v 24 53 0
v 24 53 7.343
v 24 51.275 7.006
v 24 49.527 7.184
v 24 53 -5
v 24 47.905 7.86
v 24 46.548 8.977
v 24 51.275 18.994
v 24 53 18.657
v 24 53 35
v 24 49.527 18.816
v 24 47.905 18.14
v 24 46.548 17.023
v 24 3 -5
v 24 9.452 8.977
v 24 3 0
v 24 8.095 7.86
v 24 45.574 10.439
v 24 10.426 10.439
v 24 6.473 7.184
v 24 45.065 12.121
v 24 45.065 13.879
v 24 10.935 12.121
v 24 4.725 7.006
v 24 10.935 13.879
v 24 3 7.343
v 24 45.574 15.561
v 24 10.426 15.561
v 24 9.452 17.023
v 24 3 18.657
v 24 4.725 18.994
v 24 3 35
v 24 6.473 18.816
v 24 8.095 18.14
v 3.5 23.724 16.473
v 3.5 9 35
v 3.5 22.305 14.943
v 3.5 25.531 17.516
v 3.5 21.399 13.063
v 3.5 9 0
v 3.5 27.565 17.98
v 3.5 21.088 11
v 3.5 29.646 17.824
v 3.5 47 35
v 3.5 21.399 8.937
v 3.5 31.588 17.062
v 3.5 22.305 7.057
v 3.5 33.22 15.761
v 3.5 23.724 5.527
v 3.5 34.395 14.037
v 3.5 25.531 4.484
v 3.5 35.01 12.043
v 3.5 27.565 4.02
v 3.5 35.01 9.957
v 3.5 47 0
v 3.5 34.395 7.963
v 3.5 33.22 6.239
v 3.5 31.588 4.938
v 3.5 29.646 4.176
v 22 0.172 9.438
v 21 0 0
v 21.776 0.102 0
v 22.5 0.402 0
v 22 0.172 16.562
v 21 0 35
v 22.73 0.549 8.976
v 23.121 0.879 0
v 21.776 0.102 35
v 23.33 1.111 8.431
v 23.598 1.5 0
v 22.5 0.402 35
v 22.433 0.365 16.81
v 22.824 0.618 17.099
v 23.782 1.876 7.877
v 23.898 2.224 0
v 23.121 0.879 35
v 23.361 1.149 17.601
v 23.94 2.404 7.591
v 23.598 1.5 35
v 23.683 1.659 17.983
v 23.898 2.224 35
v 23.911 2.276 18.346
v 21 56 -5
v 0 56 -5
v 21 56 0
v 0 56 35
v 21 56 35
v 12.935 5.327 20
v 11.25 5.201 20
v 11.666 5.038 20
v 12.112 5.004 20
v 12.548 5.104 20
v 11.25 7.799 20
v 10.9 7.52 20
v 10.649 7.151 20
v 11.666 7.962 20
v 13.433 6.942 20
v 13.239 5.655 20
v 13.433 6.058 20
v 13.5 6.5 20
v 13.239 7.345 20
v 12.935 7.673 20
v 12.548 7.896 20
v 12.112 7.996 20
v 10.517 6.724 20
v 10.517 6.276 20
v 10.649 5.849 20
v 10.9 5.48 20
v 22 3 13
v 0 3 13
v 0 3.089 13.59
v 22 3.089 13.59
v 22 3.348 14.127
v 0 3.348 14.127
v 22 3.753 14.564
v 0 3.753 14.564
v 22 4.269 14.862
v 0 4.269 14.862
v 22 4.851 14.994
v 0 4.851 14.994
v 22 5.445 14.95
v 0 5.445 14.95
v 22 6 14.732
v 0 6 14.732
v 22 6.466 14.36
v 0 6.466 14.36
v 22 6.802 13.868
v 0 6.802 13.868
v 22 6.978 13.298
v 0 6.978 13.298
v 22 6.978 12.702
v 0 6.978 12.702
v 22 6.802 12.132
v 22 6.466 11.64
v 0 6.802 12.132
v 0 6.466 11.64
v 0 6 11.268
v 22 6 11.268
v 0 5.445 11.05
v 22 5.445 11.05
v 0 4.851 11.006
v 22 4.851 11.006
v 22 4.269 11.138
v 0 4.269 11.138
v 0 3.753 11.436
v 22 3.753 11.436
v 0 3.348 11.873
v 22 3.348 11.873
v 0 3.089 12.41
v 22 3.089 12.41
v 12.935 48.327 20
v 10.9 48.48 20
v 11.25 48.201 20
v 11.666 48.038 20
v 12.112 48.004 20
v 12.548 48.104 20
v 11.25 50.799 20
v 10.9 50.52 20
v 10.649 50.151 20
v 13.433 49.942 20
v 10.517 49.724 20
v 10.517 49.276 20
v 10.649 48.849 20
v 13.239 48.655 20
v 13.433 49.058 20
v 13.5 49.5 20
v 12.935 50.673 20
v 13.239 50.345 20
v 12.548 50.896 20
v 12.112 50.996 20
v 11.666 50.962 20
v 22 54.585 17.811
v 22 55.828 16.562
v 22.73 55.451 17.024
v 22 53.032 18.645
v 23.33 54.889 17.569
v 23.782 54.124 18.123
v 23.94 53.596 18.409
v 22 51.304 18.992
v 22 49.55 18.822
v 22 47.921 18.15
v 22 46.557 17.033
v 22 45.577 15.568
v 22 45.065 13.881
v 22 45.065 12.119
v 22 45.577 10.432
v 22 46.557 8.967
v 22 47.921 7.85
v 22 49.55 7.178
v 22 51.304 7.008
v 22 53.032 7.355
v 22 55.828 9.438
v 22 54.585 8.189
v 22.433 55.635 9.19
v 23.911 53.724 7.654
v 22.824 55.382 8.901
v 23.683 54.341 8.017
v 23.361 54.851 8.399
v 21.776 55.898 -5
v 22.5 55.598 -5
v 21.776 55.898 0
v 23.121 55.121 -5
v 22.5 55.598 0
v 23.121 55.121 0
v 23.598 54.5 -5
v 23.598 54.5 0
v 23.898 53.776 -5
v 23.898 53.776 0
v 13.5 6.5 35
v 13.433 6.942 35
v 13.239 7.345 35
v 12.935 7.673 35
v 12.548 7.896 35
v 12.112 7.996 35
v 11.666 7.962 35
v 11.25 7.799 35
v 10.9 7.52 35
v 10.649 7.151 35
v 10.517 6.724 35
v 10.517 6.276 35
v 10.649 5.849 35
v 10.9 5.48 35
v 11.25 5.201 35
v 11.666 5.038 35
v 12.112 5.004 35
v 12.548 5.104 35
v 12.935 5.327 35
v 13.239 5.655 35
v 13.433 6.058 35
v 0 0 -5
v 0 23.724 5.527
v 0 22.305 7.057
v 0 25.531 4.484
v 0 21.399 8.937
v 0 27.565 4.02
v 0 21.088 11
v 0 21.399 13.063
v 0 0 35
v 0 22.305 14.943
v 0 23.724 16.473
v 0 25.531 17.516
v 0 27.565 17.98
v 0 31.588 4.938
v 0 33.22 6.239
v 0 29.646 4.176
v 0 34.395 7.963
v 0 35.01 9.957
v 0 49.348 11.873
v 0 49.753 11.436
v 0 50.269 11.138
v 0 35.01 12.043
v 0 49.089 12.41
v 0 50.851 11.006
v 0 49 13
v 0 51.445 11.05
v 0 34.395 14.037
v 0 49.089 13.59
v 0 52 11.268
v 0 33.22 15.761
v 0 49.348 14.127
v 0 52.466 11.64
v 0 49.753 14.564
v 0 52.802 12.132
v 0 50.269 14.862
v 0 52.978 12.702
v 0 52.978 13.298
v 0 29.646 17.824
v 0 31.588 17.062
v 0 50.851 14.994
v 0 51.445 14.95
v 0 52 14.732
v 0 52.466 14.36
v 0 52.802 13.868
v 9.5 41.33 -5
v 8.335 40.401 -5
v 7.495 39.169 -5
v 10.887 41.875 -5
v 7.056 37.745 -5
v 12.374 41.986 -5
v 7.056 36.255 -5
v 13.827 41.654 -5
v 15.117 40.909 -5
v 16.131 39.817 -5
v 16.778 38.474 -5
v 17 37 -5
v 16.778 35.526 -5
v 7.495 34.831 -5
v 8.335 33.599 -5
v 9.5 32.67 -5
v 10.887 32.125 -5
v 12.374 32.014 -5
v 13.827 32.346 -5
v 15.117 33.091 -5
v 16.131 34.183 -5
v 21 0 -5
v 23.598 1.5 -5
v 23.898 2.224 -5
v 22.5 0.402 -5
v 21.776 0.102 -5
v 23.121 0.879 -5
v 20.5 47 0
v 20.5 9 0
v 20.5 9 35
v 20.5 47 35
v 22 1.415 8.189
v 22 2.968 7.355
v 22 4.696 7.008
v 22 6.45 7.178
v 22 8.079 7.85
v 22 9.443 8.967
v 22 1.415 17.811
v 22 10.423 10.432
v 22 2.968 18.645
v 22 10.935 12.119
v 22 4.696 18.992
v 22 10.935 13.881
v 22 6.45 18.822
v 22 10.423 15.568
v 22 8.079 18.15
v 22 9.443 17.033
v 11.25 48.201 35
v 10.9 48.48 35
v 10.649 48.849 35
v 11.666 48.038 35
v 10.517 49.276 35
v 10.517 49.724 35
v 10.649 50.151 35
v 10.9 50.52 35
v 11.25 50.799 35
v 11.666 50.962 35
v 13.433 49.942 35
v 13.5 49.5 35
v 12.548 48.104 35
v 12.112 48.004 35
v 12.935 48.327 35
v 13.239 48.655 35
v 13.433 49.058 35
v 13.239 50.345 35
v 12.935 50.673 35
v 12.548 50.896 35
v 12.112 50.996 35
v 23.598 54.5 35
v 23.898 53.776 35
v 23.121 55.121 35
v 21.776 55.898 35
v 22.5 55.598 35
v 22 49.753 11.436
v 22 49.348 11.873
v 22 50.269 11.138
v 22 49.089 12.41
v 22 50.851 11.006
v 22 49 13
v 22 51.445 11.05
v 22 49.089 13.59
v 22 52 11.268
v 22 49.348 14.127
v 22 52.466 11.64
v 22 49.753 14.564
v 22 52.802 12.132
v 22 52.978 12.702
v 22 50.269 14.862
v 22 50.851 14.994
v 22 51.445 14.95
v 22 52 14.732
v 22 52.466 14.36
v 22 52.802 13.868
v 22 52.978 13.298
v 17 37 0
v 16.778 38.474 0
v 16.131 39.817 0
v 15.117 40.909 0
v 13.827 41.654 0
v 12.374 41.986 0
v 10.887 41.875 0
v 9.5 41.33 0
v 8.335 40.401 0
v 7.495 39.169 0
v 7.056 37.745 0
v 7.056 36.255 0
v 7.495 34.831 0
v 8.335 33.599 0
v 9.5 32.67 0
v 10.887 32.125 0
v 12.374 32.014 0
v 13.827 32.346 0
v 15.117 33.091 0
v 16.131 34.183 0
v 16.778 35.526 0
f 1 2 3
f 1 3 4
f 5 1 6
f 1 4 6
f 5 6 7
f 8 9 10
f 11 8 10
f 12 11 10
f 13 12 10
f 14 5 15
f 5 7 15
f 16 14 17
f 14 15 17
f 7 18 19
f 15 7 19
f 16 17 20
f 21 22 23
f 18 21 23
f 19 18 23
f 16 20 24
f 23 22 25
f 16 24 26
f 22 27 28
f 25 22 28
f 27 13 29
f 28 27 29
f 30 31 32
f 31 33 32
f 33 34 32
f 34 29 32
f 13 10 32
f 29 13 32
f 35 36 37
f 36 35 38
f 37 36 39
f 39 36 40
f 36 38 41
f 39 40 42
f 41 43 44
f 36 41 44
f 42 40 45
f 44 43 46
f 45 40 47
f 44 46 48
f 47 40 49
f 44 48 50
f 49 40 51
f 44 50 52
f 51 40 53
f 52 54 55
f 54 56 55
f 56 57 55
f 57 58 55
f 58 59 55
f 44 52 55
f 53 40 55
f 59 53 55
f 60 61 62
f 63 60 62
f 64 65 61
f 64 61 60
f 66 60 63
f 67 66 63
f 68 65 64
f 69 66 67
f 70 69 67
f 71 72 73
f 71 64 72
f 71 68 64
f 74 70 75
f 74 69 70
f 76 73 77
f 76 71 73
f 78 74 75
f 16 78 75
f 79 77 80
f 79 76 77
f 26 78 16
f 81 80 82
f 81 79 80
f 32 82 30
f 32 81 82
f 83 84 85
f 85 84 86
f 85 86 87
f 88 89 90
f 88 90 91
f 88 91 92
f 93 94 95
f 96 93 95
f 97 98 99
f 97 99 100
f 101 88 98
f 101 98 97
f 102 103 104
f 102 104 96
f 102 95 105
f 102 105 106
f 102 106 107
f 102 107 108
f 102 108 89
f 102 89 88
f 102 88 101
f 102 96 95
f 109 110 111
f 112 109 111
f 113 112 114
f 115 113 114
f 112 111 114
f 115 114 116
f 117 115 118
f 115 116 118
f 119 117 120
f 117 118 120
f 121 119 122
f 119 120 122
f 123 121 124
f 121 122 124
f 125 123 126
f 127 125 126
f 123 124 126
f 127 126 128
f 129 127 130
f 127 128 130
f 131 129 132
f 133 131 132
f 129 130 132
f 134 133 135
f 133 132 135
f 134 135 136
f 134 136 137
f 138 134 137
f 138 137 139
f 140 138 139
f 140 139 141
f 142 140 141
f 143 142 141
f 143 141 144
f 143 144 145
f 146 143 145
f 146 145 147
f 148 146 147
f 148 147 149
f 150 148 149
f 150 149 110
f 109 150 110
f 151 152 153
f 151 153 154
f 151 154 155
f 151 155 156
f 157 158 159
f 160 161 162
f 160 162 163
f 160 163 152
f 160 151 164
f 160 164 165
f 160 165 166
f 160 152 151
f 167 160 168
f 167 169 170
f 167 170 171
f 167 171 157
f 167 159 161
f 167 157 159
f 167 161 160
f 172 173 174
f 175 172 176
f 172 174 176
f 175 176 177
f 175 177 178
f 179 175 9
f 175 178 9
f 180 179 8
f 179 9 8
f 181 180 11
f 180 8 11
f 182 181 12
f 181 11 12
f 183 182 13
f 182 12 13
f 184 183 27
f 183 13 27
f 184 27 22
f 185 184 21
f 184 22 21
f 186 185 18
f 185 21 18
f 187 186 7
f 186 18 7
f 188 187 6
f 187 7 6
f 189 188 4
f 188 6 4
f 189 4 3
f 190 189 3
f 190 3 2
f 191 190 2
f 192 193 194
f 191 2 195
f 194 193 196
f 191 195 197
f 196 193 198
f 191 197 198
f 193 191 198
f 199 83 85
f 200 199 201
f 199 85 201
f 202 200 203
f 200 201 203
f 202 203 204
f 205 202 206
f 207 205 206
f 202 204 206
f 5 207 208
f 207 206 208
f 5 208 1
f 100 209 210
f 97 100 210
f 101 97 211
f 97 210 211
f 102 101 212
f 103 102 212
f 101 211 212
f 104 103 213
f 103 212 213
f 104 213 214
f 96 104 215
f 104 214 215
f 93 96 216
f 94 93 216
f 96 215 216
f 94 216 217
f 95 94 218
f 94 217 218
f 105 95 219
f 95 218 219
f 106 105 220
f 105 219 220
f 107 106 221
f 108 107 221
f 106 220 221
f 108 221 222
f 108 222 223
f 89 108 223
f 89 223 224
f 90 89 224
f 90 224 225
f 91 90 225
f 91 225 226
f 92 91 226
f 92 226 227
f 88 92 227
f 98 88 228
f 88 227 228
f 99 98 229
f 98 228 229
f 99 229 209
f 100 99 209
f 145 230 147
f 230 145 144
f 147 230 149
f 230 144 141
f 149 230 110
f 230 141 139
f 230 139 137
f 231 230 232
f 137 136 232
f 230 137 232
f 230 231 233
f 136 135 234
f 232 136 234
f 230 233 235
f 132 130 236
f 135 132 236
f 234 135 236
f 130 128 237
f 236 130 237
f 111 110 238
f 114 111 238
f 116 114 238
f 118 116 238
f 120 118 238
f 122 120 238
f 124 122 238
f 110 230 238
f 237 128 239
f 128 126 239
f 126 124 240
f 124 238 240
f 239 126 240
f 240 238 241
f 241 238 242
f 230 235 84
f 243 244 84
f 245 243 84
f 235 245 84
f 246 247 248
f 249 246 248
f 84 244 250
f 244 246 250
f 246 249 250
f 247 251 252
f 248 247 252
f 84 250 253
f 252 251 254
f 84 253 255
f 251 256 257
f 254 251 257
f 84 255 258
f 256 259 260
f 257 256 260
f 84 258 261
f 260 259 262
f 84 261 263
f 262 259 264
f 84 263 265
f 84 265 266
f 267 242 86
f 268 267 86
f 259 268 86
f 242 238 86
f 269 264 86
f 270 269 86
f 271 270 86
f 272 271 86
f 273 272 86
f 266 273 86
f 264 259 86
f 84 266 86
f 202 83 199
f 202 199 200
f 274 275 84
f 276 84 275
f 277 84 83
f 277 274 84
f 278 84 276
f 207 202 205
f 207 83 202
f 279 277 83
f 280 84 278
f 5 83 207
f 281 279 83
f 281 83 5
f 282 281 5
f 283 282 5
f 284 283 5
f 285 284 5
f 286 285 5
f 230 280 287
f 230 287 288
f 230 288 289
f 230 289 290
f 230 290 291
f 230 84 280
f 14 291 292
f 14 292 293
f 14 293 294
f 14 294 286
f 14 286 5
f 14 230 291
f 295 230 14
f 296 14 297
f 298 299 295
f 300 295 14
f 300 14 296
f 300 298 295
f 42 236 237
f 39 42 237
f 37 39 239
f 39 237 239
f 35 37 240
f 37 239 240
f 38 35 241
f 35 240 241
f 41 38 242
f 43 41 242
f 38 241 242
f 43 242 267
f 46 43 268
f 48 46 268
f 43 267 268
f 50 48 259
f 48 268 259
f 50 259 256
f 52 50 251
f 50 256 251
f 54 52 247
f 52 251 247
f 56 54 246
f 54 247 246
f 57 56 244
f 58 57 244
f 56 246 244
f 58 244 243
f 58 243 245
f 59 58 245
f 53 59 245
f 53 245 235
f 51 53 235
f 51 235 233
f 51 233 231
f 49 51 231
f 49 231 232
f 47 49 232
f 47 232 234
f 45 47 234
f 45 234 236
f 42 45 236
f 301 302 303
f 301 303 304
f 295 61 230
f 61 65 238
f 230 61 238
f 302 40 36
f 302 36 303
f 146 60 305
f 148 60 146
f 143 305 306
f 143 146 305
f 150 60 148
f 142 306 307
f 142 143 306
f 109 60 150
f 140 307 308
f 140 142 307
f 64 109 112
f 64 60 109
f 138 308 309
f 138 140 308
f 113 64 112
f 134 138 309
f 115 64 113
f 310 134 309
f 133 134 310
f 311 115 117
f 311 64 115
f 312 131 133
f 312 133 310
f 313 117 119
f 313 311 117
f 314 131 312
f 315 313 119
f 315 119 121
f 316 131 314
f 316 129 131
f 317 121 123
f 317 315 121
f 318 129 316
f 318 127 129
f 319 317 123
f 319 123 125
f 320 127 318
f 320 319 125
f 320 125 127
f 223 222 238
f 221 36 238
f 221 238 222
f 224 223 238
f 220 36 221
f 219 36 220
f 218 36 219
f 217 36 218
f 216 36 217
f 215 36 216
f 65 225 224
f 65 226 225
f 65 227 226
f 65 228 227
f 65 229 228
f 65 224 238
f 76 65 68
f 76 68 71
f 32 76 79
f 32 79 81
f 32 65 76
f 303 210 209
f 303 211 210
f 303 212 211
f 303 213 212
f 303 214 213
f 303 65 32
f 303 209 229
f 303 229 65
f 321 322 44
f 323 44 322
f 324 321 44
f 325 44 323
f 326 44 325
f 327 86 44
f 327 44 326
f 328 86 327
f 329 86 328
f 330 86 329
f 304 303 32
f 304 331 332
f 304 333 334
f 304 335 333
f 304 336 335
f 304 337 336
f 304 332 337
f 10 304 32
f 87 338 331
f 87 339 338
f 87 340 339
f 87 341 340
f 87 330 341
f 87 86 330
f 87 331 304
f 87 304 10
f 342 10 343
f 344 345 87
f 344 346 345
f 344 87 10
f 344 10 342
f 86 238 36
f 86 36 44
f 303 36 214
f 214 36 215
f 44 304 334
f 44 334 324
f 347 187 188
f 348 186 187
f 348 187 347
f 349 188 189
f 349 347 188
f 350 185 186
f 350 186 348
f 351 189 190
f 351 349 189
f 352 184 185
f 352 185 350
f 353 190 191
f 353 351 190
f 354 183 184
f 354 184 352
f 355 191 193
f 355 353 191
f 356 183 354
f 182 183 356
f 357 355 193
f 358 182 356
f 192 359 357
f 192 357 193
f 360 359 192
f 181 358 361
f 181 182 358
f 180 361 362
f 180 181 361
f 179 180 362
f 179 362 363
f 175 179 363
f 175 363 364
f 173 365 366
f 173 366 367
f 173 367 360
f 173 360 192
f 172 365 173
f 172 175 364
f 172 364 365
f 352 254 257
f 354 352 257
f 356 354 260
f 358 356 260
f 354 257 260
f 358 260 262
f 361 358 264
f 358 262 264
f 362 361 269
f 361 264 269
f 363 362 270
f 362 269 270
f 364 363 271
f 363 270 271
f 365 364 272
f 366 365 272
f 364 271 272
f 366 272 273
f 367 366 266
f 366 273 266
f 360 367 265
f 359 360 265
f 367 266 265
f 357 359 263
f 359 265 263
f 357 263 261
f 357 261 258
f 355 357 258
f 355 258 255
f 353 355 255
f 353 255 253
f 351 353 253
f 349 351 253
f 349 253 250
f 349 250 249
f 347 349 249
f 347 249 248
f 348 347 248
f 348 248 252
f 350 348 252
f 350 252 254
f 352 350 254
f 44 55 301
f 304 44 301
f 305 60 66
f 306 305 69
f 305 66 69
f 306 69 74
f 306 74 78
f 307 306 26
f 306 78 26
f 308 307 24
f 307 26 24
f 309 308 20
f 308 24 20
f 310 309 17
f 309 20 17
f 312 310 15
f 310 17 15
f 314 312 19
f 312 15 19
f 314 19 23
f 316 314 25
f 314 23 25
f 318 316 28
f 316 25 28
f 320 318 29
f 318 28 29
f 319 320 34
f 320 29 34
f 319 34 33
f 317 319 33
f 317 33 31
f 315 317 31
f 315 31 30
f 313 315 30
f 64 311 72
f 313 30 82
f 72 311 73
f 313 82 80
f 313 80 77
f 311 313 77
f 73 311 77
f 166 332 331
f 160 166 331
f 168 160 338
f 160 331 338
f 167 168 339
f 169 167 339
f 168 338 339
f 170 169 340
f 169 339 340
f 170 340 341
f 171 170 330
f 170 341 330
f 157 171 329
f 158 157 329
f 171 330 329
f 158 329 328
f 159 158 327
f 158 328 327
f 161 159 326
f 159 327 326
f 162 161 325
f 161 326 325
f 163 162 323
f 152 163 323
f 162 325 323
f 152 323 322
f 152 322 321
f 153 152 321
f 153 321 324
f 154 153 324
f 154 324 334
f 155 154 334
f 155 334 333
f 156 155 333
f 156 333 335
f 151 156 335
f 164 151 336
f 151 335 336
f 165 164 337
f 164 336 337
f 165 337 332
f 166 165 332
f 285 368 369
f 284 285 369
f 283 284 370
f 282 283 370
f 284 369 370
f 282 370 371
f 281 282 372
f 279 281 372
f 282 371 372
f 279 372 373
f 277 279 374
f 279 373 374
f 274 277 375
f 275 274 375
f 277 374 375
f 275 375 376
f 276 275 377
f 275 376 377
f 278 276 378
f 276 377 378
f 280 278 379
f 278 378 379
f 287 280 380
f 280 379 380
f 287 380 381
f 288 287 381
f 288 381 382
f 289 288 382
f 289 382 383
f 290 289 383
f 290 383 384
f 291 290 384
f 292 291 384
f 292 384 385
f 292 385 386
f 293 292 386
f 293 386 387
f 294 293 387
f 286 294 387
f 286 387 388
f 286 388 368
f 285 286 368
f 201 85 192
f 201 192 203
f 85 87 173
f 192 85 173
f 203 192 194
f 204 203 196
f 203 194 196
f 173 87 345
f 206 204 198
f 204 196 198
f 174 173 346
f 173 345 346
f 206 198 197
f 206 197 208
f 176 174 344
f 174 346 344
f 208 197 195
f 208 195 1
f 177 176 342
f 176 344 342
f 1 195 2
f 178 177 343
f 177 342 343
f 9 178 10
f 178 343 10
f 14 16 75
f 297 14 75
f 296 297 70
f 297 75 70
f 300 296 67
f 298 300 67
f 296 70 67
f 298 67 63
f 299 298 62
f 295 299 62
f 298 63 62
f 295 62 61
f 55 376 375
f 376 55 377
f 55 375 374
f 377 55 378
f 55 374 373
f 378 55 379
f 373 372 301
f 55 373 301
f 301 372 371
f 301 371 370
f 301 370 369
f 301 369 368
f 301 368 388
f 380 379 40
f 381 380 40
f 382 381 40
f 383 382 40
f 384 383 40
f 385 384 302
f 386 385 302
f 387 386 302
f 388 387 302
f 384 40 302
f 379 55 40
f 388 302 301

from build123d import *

# Parameters (mm, degrees)
F0_W      = 24
F0_H      = 56
F0_W_2    = 17
F0_H_2    = 38
F1_DEPTH  = 35
F2_R      = 1.5
F3_DEPTH  = 15
F4_R      = 3
F6_DEPTH  = 5
F7_R      = 5
F8_DEPTH  = 25
F9_R      = 2
F10_DEPTH = 25
F11_R     = 6
F12_DEPTH = 2
F13_R     = 7
F14_DEPTH = 4


with BuildPart() as f1:
    # F0 (on Top) → F1 (new body)
    with BuildSketch(Plane.XY):
        with Locations((12, 28)):
            Rectangle(F0_W, F0_H)
        with Locations((12, 28)):
            Rectangle(F0_W_2, F0_H_2, mode=Mode.SUBTRACT)
    extrude(amount=F1_DEPTH)

    # F2 (on face) → F3 (cut)
    with BuildSketch(Plane.XY.offset(35)):
        with Locations((12, 49.5)):
            Circle(F2_R)
        with Locations((12, 6.5)):
            Circle(F2_R)
    extrude(amount=-F3_DEPTH, mode=Mode.SUBTRACT)

    # F4
    f4_edges = [f1.edges().sort_by_distance(p)[0] for p in [
        (24, 0, 17.5),
        (24, 56, 17.5),
    ]]
    fillet(f4_edges, radius=F4_R)

    # F5 (on face) → F6 (join)
    with BuildSketch(Plane(origin=(0, 0, 0), x_dir=(1, 0, 0), z_dir=(0, 0, -1))):
        with BuildLine():
            Line((21, 0), (0, 0))
            Line((0, 0), (0, -56))
            Line((0, -56), (21, -56))
            ThreePointArc((21, -56), (23.12132, -55.12132), (24, -53))
            Line((24, -53), (24, -3))
            ThreePointArc((24, -3), (23.12132, -0.87868), (21, 0))
        make_face()
    extrude(amount=F6_DEPTH)

    # F7 (on face) → F8 (cut)
    with BuildSketch(Plane.XY):
        with Locations((12, 37)):
            Circle(F7_R)
    extrude(amount=-F8_DEPTH, mode=Mode.SUBTRACT)

    # F9 (on face) → F10 (cut)
    with BuildSketch(Plane(origin=(0, 0, 0), x_dir=(0, -1, 0), z_dir=(-1, 0, 0))):
        with Locations((-51, 13)):
            Circle(F9_R)
        with Locations((-5, 13)):
            Circle(F9_R)
    extrude(amount=-F10_DEPTH, mode=Mode.SUBTRACT)

    # F11 (on face) → F12 (cut)
    with BuildSketch(Plane.YZ.offset(24)):
        with Locations((5, 13)):
            Circle(F11_R)
        with Locations((51, 13)):
            Circle(F11_R)
    extrude(amount=-F12_DEPTH, mode=Mode.SUBTRACT)

    # F13 (on face) → F14 (cut)
    with BuildSketch(Plane(origin=(0, 0, 0), x_dir=(0, -1, 0), z_dir=(-1, 0, 0))):
        with Locations((-28.088422, 11)):
            Circle(F13_R)
    extrude(amount=-F14_DEPTH, mode=Mode.SUBTRACT)


solid = f1.part
